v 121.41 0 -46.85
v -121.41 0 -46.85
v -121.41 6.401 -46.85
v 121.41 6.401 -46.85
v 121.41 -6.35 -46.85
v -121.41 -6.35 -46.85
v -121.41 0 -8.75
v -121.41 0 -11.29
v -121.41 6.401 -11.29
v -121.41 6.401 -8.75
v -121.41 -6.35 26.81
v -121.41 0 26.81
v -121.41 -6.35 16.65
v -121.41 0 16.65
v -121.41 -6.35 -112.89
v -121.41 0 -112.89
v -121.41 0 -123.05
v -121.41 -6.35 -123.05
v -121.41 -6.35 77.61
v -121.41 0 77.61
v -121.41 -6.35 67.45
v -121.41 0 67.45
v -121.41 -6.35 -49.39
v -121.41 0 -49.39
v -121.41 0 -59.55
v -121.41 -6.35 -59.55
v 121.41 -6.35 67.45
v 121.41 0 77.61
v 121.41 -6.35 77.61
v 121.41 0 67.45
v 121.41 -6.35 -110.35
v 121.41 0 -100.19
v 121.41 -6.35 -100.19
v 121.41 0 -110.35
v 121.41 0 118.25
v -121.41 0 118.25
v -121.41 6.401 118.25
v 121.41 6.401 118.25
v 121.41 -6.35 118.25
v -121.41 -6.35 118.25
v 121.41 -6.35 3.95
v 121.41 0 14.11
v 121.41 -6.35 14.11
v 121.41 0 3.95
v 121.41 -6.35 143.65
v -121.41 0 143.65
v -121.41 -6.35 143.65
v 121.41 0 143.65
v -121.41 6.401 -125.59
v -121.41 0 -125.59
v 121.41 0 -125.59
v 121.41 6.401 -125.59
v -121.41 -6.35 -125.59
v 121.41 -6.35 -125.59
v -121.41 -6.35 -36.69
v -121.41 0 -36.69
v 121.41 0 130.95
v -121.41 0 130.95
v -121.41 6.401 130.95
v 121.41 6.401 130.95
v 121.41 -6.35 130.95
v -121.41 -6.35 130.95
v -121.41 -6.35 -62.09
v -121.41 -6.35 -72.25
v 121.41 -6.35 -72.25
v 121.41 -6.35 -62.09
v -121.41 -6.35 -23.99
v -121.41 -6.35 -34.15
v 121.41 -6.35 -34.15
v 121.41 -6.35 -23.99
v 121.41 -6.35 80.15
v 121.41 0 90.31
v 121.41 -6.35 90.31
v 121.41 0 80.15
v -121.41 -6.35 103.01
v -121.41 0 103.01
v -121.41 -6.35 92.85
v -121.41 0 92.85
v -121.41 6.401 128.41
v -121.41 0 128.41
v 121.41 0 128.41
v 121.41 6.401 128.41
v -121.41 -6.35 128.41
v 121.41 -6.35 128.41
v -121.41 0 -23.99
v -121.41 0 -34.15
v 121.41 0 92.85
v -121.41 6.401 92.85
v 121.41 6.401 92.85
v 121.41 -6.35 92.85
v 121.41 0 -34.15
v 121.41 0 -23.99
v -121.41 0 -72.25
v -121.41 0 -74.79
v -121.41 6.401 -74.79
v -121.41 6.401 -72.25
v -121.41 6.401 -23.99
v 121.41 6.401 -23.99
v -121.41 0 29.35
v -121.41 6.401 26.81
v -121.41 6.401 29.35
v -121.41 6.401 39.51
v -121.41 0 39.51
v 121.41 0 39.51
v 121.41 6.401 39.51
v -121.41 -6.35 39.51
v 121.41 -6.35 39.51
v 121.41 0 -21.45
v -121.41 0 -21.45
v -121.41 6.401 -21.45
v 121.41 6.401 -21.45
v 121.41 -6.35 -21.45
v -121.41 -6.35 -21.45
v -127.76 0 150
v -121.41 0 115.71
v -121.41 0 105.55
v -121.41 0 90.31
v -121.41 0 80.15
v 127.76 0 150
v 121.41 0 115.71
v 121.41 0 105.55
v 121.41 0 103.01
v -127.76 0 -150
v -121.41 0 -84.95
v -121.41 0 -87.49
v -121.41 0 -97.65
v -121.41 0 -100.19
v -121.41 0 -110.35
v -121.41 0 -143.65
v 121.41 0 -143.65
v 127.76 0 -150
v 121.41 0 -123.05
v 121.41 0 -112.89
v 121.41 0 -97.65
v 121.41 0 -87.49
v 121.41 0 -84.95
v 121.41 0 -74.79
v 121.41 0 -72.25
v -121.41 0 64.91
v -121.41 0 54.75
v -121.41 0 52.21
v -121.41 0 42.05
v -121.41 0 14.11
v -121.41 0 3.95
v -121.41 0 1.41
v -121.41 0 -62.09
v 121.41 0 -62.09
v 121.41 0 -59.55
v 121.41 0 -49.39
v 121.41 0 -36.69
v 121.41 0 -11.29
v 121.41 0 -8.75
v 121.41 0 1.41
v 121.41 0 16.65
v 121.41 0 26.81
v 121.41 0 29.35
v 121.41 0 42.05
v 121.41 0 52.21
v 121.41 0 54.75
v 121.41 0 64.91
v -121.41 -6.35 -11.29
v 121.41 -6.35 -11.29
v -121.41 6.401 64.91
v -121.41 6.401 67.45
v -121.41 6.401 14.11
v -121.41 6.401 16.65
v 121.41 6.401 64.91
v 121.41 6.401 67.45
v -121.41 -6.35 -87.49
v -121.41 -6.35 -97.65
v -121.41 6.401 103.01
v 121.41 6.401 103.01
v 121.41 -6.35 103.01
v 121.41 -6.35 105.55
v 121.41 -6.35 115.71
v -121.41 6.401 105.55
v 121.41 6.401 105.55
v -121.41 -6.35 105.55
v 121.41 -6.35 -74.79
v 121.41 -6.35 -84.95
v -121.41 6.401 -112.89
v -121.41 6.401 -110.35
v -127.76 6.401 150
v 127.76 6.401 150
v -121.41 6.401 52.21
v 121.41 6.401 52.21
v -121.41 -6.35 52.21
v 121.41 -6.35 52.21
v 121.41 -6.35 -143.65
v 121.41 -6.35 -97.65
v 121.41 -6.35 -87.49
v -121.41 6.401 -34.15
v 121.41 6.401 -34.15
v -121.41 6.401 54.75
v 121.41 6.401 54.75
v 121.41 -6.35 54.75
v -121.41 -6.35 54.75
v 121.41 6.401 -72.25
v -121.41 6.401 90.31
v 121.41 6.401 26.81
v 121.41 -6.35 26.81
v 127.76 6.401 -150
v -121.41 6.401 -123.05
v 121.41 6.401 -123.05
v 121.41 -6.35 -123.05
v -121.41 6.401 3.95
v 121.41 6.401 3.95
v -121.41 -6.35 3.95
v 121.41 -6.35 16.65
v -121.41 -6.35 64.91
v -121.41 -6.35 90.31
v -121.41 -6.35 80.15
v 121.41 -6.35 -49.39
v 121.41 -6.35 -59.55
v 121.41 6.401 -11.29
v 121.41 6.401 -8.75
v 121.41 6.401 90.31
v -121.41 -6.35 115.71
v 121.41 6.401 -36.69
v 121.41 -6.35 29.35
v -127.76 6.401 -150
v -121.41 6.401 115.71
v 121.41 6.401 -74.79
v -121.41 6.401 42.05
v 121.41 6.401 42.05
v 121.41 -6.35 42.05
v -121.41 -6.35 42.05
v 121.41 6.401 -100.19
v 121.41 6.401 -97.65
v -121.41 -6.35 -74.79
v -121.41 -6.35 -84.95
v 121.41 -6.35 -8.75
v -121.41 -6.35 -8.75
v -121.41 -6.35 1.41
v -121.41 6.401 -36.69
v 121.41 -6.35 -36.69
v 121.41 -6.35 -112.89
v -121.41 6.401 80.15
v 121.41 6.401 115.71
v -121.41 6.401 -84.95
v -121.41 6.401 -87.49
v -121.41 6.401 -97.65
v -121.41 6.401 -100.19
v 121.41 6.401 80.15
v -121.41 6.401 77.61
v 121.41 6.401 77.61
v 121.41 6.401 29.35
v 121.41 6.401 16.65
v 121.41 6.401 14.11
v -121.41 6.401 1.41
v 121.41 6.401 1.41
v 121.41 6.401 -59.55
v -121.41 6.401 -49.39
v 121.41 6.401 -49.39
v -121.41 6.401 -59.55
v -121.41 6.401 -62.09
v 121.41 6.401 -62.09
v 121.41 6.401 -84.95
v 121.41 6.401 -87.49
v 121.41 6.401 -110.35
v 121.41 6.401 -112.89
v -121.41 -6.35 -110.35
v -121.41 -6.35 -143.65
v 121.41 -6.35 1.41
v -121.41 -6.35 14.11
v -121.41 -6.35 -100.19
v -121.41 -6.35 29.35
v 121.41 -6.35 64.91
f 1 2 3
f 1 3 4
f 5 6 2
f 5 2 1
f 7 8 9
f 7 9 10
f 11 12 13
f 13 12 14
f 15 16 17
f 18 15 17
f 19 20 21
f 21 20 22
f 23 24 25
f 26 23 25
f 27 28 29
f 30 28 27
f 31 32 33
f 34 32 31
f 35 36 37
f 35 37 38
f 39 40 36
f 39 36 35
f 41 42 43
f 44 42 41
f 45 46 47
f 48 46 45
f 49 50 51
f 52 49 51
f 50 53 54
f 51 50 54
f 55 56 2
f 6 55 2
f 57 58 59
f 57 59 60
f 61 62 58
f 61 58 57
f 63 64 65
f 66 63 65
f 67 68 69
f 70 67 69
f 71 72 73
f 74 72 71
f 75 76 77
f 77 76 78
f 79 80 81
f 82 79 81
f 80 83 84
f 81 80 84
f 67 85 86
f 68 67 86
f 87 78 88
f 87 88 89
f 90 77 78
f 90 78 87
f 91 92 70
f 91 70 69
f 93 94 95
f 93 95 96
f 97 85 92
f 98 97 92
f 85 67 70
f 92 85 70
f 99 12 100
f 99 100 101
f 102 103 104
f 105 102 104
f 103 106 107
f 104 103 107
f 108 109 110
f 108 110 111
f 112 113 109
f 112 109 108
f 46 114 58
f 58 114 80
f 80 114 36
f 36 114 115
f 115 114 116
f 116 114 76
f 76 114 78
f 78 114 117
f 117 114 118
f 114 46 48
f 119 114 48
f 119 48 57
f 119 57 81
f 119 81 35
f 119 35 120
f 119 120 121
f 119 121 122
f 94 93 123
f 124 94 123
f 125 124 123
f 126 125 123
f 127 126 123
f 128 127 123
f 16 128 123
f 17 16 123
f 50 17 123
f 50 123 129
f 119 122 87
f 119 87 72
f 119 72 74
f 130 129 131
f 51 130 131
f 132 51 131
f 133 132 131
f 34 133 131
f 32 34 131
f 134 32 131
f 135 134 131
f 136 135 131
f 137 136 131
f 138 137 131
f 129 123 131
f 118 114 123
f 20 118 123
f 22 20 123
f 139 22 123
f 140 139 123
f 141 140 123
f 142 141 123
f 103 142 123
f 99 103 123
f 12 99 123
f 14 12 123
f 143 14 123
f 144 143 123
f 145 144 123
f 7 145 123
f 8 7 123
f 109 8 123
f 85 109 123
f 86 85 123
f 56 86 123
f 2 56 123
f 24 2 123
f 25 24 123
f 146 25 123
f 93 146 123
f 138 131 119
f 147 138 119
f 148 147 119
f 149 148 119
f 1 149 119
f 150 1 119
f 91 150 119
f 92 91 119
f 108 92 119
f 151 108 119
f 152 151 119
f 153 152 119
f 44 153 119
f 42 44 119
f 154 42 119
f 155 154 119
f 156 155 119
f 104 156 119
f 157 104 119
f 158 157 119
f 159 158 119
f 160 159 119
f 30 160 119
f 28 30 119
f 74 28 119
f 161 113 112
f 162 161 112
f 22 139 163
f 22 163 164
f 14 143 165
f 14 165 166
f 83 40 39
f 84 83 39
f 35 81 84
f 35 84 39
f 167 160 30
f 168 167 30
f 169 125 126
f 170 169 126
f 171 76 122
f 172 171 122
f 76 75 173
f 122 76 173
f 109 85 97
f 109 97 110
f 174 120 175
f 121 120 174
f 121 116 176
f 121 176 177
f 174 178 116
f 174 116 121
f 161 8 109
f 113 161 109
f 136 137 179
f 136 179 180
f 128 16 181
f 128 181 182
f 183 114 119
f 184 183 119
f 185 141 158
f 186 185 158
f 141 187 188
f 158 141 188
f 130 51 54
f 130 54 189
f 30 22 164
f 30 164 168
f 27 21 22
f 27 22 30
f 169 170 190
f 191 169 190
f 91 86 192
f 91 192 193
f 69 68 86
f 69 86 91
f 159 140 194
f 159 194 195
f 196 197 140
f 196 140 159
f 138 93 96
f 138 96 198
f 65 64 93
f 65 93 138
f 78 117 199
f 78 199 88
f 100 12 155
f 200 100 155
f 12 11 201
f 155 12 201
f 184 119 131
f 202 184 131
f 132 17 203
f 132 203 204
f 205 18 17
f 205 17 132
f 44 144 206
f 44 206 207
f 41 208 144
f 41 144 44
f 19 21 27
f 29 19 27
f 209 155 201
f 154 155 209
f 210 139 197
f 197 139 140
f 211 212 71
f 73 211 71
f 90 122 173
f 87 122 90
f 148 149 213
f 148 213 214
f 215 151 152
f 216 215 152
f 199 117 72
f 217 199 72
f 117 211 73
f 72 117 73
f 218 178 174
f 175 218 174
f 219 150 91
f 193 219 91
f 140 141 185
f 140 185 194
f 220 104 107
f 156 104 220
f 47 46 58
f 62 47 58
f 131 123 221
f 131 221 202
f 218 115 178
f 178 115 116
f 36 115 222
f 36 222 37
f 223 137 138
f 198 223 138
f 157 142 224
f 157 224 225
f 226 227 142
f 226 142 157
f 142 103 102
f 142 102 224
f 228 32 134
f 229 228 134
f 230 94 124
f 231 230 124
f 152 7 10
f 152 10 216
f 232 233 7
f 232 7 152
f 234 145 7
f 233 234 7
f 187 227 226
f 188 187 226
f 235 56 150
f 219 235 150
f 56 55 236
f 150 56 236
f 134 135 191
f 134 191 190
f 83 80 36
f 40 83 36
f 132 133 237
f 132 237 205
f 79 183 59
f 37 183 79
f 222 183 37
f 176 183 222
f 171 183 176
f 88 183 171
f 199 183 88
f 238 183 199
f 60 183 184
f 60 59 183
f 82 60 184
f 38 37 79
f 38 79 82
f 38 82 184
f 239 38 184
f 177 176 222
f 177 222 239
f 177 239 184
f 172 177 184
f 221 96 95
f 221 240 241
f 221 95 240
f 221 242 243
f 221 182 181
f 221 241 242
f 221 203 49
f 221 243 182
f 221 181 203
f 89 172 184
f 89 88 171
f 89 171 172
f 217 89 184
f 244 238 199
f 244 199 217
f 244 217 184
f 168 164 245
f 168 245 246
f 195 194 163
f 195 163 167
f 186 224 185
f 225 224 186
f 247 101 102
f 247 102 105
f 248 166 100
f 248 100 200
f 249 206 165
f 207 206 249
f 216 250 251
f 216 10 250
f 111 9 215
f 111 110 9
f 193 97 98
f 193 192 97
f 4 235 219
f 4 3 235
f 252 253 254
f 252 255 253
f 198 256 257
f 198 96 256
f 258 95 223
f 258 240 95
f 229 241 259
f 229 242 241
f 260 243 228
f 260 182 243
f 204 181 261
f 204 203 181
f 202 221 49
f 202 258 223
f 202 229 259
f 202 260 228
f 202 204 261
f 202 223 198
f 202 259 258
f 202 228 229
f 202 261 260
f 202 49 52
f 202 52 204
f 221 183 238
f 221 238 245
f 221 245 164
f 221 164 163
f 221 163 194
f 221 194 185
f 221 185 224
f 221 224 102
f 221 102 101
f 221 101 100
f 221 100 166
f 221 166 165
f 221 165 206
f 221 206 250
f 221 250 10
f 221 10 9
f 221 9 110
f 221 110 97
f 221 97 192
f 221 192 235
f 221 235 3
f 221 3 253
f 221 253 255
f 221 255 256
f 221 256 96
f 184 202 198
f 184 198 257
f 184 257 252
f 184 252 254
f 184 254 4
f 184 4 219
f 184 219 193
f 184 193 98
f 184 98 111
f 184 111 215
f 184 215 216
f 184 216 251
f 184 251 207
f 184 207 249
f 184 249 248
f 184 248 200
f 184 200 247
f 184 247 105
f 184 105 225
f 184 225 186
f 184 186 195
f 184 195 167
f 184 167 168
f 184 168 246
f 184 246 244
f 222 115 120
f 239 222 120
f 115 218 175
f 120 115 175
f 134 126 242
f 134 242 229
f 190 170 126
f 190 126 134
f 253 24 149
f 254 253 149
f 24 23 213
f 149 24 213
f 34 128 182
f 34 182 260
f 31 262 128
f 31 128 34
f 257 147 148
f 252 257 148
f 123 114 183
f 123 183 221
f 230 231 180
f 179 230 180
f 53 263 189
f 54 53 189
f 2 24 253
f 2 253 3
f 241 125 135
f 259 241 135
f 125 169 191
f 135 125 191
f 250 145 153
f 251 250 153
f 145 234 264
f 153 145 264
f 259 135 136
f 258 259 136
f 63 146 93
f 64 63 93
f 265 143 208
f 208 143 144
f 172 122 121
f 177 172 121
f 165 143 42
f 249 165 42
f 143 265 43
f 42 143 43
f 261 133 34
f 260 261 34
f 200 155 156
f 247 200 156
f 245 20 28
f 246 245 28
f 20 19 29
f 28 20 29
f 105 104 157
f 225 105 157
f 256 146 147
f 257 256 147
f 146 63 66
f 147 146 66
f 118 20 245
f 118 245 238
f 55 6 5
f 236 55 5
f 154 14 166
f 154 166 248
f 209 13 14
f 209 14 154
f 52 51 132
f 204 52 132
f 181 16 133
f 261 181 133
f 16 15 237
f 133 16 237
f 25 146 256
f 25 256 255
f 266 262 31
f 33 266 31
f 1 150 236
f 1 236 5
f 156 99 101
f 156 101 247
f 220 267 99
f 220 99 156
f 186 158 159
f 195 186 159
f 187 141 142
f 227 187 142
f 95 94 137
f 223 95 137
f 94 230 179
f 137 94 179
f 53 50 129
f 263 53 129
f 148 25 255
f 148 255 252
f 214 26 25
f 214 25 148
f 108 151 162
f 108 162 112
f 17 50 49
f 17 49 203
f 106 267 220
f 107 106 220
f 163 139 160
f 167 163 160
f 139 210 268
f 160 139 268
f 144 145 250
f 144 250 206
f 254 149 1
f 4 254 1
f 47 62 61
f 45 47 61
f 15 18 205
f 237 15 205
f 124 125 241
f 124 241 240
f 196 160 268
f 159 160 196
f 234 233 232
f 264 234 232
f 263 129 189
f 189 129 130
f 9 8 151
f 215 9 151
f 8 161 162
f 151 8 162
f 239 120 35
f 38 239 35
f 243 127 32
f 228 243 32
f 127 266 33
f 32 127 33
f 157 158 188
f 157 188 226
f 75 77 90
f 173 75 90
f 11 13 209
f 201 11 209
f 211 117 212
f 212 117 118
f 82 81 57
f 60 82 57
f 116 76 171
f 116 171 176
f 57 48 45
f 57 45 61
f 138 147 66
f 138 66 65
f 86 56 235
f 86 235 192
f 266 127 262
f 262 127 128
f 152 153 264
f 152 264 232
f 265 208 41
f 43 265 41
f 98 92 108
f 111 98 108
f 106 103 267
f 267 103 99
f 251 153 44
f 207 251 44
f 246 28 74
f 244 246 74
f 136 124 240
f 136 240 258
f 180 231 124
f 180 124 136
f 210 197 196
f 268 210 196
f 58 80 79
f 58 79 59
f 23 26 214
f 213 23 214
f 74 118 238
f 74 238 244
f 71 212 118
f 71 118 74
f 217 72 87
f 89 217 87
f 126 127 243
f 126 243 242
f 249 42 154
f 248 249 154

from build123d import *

# Parameters (mm, degrees)
SKETCH1_W           = 242.82
SKETCH1_H           = 287.3
BOSS_EXTRUDE1_DEPTH = 6.35
SKETCH4_W           = 255.52
SKETCH4_H           = 300
BOSS_EXTRUDE4_DEPTH = 6.4008
SKETCH5_W           = 242.82
SKETCH5_H           = 2.54
BOSS_EXTRUDE5_DEPTH = 49.5808
LPATTERN1_COUNT     = 21
LPATTERN1_PITCH     = 12.7


with BuildPart() as part:
    # Sketch1 → Boss-Extrude1 (new body)
    with BuildSketch(Plane(origin=(0, 0, 0), x_dir=(1, 0, 0), z_dir=(0, 1, 0))):
        Rectangle(SKETCH1_W, SKETCH1_H)
    extrude(amount=-BOSS_EXTRUDE1_DEPTH)

    # Sketch4 → Boss-Extrude4 (add)
    with BuildSketch(Plane(origin=(0, 0, 0), x_dir=(1, 0, 0), z_dir=(0, 1, 0))):
        Rectangle(SKETCH4_W, SKETCH4_H)
    extrude(amount=BOSS_EXTRUDE4_DEPTH)


with BuildPart() as body_2:
    # Sketch5 → Boss-Extrude5 (new body)
    with BuildSketch(Plane.XZ.offset(6.35)):
        with Locations((0, 129.68)):
            Rectangle(SKETCH5_W, SKETCH5_H)
    boss_extrude5 = extrude(amount=-BOSS_EXTRUDE5_DEPTH)


with BuildPart() as lpattern1_1:
    # LPattern1: pattern copy
    add(boss_extrude5.moved(Location(Vector(0, 0, -1) * (1 * LPATTERN1_PITCH))))


with BuildPart() as lpattern1_2:
    # LPattern1: pattern copy
    add(boss_extrude5.moved(Location(Vector(0, 0, -1) * (2 * LPATTERN1_PITCH))))


with BuildPart() as lpattern1_3:
    # LPattern1: pattern copy
    add(boss_extrude5.moved(Location(Vector(0, 0, -1) * (3 * LPATTERN1_PITCH))))


with BuildPart() as lpattern1_4:
    # LPattern1: pattern copy
    add(boss_extrude5.moved(Location(Vector(0, 0, -1) * (4 * LPATTERN1_PITCH))))


with BuildPart() as lpattern1_5:
    # LPattern1: pattern copy
    add(boss_extrude5.moved(Location(Vector(0, 0, -1) * (5 * LPATTERN1_PITCH))))


with BuildPart() as lpattern1_6:
    # LPattern1: pattern copy
    add(boss_extrude5.moved(Location(Vector(0, 0, -1) * (6 * LPATTERN1_PITCH))))


with BuildPart() as lpattern1_7:
    # LPattern1: pattern copy
    add(boss_extrude5.moved(Location(Vector(0, 0, -1) * (7 * LPATTERN1_PITCH))))


with BuildPart() as lpattern1_8:
    # LPattern1: pattern copy
    add(boss_extrude5.moved(Location(Vector(0, 0, -1) * (8 * LPATTERN1_PITCH))))


with BuildPart() as lpattern1_9:
    # LPattern1: pattern copy
    add(boss_extrude5.moved(Location(Vector(0, 0, -1) * (9 * LPATTERN1_PITCH))))


with BuildPart() as lpattern1_10:
    # LPattern1: pattern copy
    add(boss_extrude5.moved(Location(Vector(0, 0, -1) * (10 * LPATTERN1_PITCH))))


with BuildPart() as lpattern1_11:
    # LPattern1: pattern copy
    add(boss_extrude5.moved(Location(Vector(0, 0, -1) * (11 * LPATTERN1_PITCH))))


with BuildPart() as lpattern1_12:
    # LPattern1: pattern copy
    add(boss_extrude5.moved(Location(Vector(0, 0, -1) * (12 * LPATTERN1_PITCH))))


with BuildPart() as lpattern1_13:
    # LPattern1: pattern copy
    add(boss_extrude5.moved(Location(Vector(0, 0, -1) * (13 * LPATTERN1_PITCH))))


with BuildPart() as lpattern1_14:
    # LPattern1: pattern copy
    add(boss_extrude5.moved(Location(Vector(0, 0, -1) * (14 * LPATTERN1_PITCH))))


with BuildPart() as lpattern1_15:
    # LPattern1: pattern copy
    add(boss_extrude5.moved(Location(Vector(0, 0, -1) * (15 * LPATTERN1_PITCH))))


with BuildPart() as lpattern1_16:
    # LPattern1: pattern copy
    add(boss_extrude5.moved(Location(Vector(0, 0, -1) * (16 * LPATTERN1_PITCH))))


with BuildPart() as lpattern1_17:
    # LPattern1: pattern copy
    add(boss_extrude5.moved(Location(Vector(0, 0, -1) * (17 * LPATTERN1_PITCH))))


with BuildPart() as lpattern1_18:
    # LPattern1: pattern copy
    add(boss_extrude5.moved(Location(Vector(0, 0, -1) * (18 * LPATTERN1_PITCH))))


with BuildPart() as lpattern1_19:
    # LPattern1: pattern copy
    add(boss_extrude5.moved(Location(Vector(0, 0, -1) * (19 * LPATTERN1_PITCH))))


with BuildPart() as lpattern1_20:
    # LPattern1: pattern copy
    add(boss_extrude5.moved(Location(Vector(0, 0, -1) * (20 * LPATTERN1_PITCH))))


with BuildPart() as part_1:
    add(part.part)

    # Combine1: cut body 2, LPattern1_1, LPattern1_2, LPattern1_3, LPattern1_5, LPattern1_6, LPattern1_4, LPattern1_7, LPattern1_8, LPattern1_10, LPattern1_11, LPattern1_9, LPattern1_12, LPattern1_16, LPattern1_18, LPattern1_20, LPattern1_19, LPattern1_17, LPattern1_15, LPattern1_14, LPattern1_13
    add(body_2.part, mode=Mode.SUBTRACT)
    add(lpattern1_1.part, mode=Mode.SUBTRACT)
    add(lpattern1_2.part, mode=Mode.SUBTRACT)
    add(lpattern1_3.part, mode=Mode.SUBTRACT)
    add(lpattern1_5.part, mode=Mode.SUBTRACT)
    add(lpattern1_6.part, mode=Mode.SUBTRACT)
    add(lpattern1_4.part, mode=Mode.SUBTRACT)
    add(lpattern1_7.part, mode=Mode.SUBTRACT)
    add(lpattern1_8.part, mode=Mode.SUBTRACT)
    add(lpattern1_10.part, mode=Mode.SUBTRACT)
    add(lpattern1_11.part, mode=Mode.SUBTRACT)
    add(lpattern1_9.part, mode=Mode.SUBTRACT)
    add(lpattern1_12.part, mode=Mode.SUBTRACT)
    add(lpattern1_16.part, mode=Mode.SUBTRACT)
    add(lpattern1_18.part, mode=Mode.SUBTRACT)
    add(lpattern1_20.part, mode=Mode.SUBTRACT)
    add(lpattern1_19.part, mode=Mode.SUBTRACT)
    add(lpattern1_17.part, mode=Mode.SUBTRACT)
    add(lpattern1_15.part, mode=Mode.SUBTRACT)
    add(lpattern1_14.part, mode=Mode.SUBTRACT)
    add(lpattern1_13.part, mode=Mode.SUBTRACT)


solid = part_1.part
